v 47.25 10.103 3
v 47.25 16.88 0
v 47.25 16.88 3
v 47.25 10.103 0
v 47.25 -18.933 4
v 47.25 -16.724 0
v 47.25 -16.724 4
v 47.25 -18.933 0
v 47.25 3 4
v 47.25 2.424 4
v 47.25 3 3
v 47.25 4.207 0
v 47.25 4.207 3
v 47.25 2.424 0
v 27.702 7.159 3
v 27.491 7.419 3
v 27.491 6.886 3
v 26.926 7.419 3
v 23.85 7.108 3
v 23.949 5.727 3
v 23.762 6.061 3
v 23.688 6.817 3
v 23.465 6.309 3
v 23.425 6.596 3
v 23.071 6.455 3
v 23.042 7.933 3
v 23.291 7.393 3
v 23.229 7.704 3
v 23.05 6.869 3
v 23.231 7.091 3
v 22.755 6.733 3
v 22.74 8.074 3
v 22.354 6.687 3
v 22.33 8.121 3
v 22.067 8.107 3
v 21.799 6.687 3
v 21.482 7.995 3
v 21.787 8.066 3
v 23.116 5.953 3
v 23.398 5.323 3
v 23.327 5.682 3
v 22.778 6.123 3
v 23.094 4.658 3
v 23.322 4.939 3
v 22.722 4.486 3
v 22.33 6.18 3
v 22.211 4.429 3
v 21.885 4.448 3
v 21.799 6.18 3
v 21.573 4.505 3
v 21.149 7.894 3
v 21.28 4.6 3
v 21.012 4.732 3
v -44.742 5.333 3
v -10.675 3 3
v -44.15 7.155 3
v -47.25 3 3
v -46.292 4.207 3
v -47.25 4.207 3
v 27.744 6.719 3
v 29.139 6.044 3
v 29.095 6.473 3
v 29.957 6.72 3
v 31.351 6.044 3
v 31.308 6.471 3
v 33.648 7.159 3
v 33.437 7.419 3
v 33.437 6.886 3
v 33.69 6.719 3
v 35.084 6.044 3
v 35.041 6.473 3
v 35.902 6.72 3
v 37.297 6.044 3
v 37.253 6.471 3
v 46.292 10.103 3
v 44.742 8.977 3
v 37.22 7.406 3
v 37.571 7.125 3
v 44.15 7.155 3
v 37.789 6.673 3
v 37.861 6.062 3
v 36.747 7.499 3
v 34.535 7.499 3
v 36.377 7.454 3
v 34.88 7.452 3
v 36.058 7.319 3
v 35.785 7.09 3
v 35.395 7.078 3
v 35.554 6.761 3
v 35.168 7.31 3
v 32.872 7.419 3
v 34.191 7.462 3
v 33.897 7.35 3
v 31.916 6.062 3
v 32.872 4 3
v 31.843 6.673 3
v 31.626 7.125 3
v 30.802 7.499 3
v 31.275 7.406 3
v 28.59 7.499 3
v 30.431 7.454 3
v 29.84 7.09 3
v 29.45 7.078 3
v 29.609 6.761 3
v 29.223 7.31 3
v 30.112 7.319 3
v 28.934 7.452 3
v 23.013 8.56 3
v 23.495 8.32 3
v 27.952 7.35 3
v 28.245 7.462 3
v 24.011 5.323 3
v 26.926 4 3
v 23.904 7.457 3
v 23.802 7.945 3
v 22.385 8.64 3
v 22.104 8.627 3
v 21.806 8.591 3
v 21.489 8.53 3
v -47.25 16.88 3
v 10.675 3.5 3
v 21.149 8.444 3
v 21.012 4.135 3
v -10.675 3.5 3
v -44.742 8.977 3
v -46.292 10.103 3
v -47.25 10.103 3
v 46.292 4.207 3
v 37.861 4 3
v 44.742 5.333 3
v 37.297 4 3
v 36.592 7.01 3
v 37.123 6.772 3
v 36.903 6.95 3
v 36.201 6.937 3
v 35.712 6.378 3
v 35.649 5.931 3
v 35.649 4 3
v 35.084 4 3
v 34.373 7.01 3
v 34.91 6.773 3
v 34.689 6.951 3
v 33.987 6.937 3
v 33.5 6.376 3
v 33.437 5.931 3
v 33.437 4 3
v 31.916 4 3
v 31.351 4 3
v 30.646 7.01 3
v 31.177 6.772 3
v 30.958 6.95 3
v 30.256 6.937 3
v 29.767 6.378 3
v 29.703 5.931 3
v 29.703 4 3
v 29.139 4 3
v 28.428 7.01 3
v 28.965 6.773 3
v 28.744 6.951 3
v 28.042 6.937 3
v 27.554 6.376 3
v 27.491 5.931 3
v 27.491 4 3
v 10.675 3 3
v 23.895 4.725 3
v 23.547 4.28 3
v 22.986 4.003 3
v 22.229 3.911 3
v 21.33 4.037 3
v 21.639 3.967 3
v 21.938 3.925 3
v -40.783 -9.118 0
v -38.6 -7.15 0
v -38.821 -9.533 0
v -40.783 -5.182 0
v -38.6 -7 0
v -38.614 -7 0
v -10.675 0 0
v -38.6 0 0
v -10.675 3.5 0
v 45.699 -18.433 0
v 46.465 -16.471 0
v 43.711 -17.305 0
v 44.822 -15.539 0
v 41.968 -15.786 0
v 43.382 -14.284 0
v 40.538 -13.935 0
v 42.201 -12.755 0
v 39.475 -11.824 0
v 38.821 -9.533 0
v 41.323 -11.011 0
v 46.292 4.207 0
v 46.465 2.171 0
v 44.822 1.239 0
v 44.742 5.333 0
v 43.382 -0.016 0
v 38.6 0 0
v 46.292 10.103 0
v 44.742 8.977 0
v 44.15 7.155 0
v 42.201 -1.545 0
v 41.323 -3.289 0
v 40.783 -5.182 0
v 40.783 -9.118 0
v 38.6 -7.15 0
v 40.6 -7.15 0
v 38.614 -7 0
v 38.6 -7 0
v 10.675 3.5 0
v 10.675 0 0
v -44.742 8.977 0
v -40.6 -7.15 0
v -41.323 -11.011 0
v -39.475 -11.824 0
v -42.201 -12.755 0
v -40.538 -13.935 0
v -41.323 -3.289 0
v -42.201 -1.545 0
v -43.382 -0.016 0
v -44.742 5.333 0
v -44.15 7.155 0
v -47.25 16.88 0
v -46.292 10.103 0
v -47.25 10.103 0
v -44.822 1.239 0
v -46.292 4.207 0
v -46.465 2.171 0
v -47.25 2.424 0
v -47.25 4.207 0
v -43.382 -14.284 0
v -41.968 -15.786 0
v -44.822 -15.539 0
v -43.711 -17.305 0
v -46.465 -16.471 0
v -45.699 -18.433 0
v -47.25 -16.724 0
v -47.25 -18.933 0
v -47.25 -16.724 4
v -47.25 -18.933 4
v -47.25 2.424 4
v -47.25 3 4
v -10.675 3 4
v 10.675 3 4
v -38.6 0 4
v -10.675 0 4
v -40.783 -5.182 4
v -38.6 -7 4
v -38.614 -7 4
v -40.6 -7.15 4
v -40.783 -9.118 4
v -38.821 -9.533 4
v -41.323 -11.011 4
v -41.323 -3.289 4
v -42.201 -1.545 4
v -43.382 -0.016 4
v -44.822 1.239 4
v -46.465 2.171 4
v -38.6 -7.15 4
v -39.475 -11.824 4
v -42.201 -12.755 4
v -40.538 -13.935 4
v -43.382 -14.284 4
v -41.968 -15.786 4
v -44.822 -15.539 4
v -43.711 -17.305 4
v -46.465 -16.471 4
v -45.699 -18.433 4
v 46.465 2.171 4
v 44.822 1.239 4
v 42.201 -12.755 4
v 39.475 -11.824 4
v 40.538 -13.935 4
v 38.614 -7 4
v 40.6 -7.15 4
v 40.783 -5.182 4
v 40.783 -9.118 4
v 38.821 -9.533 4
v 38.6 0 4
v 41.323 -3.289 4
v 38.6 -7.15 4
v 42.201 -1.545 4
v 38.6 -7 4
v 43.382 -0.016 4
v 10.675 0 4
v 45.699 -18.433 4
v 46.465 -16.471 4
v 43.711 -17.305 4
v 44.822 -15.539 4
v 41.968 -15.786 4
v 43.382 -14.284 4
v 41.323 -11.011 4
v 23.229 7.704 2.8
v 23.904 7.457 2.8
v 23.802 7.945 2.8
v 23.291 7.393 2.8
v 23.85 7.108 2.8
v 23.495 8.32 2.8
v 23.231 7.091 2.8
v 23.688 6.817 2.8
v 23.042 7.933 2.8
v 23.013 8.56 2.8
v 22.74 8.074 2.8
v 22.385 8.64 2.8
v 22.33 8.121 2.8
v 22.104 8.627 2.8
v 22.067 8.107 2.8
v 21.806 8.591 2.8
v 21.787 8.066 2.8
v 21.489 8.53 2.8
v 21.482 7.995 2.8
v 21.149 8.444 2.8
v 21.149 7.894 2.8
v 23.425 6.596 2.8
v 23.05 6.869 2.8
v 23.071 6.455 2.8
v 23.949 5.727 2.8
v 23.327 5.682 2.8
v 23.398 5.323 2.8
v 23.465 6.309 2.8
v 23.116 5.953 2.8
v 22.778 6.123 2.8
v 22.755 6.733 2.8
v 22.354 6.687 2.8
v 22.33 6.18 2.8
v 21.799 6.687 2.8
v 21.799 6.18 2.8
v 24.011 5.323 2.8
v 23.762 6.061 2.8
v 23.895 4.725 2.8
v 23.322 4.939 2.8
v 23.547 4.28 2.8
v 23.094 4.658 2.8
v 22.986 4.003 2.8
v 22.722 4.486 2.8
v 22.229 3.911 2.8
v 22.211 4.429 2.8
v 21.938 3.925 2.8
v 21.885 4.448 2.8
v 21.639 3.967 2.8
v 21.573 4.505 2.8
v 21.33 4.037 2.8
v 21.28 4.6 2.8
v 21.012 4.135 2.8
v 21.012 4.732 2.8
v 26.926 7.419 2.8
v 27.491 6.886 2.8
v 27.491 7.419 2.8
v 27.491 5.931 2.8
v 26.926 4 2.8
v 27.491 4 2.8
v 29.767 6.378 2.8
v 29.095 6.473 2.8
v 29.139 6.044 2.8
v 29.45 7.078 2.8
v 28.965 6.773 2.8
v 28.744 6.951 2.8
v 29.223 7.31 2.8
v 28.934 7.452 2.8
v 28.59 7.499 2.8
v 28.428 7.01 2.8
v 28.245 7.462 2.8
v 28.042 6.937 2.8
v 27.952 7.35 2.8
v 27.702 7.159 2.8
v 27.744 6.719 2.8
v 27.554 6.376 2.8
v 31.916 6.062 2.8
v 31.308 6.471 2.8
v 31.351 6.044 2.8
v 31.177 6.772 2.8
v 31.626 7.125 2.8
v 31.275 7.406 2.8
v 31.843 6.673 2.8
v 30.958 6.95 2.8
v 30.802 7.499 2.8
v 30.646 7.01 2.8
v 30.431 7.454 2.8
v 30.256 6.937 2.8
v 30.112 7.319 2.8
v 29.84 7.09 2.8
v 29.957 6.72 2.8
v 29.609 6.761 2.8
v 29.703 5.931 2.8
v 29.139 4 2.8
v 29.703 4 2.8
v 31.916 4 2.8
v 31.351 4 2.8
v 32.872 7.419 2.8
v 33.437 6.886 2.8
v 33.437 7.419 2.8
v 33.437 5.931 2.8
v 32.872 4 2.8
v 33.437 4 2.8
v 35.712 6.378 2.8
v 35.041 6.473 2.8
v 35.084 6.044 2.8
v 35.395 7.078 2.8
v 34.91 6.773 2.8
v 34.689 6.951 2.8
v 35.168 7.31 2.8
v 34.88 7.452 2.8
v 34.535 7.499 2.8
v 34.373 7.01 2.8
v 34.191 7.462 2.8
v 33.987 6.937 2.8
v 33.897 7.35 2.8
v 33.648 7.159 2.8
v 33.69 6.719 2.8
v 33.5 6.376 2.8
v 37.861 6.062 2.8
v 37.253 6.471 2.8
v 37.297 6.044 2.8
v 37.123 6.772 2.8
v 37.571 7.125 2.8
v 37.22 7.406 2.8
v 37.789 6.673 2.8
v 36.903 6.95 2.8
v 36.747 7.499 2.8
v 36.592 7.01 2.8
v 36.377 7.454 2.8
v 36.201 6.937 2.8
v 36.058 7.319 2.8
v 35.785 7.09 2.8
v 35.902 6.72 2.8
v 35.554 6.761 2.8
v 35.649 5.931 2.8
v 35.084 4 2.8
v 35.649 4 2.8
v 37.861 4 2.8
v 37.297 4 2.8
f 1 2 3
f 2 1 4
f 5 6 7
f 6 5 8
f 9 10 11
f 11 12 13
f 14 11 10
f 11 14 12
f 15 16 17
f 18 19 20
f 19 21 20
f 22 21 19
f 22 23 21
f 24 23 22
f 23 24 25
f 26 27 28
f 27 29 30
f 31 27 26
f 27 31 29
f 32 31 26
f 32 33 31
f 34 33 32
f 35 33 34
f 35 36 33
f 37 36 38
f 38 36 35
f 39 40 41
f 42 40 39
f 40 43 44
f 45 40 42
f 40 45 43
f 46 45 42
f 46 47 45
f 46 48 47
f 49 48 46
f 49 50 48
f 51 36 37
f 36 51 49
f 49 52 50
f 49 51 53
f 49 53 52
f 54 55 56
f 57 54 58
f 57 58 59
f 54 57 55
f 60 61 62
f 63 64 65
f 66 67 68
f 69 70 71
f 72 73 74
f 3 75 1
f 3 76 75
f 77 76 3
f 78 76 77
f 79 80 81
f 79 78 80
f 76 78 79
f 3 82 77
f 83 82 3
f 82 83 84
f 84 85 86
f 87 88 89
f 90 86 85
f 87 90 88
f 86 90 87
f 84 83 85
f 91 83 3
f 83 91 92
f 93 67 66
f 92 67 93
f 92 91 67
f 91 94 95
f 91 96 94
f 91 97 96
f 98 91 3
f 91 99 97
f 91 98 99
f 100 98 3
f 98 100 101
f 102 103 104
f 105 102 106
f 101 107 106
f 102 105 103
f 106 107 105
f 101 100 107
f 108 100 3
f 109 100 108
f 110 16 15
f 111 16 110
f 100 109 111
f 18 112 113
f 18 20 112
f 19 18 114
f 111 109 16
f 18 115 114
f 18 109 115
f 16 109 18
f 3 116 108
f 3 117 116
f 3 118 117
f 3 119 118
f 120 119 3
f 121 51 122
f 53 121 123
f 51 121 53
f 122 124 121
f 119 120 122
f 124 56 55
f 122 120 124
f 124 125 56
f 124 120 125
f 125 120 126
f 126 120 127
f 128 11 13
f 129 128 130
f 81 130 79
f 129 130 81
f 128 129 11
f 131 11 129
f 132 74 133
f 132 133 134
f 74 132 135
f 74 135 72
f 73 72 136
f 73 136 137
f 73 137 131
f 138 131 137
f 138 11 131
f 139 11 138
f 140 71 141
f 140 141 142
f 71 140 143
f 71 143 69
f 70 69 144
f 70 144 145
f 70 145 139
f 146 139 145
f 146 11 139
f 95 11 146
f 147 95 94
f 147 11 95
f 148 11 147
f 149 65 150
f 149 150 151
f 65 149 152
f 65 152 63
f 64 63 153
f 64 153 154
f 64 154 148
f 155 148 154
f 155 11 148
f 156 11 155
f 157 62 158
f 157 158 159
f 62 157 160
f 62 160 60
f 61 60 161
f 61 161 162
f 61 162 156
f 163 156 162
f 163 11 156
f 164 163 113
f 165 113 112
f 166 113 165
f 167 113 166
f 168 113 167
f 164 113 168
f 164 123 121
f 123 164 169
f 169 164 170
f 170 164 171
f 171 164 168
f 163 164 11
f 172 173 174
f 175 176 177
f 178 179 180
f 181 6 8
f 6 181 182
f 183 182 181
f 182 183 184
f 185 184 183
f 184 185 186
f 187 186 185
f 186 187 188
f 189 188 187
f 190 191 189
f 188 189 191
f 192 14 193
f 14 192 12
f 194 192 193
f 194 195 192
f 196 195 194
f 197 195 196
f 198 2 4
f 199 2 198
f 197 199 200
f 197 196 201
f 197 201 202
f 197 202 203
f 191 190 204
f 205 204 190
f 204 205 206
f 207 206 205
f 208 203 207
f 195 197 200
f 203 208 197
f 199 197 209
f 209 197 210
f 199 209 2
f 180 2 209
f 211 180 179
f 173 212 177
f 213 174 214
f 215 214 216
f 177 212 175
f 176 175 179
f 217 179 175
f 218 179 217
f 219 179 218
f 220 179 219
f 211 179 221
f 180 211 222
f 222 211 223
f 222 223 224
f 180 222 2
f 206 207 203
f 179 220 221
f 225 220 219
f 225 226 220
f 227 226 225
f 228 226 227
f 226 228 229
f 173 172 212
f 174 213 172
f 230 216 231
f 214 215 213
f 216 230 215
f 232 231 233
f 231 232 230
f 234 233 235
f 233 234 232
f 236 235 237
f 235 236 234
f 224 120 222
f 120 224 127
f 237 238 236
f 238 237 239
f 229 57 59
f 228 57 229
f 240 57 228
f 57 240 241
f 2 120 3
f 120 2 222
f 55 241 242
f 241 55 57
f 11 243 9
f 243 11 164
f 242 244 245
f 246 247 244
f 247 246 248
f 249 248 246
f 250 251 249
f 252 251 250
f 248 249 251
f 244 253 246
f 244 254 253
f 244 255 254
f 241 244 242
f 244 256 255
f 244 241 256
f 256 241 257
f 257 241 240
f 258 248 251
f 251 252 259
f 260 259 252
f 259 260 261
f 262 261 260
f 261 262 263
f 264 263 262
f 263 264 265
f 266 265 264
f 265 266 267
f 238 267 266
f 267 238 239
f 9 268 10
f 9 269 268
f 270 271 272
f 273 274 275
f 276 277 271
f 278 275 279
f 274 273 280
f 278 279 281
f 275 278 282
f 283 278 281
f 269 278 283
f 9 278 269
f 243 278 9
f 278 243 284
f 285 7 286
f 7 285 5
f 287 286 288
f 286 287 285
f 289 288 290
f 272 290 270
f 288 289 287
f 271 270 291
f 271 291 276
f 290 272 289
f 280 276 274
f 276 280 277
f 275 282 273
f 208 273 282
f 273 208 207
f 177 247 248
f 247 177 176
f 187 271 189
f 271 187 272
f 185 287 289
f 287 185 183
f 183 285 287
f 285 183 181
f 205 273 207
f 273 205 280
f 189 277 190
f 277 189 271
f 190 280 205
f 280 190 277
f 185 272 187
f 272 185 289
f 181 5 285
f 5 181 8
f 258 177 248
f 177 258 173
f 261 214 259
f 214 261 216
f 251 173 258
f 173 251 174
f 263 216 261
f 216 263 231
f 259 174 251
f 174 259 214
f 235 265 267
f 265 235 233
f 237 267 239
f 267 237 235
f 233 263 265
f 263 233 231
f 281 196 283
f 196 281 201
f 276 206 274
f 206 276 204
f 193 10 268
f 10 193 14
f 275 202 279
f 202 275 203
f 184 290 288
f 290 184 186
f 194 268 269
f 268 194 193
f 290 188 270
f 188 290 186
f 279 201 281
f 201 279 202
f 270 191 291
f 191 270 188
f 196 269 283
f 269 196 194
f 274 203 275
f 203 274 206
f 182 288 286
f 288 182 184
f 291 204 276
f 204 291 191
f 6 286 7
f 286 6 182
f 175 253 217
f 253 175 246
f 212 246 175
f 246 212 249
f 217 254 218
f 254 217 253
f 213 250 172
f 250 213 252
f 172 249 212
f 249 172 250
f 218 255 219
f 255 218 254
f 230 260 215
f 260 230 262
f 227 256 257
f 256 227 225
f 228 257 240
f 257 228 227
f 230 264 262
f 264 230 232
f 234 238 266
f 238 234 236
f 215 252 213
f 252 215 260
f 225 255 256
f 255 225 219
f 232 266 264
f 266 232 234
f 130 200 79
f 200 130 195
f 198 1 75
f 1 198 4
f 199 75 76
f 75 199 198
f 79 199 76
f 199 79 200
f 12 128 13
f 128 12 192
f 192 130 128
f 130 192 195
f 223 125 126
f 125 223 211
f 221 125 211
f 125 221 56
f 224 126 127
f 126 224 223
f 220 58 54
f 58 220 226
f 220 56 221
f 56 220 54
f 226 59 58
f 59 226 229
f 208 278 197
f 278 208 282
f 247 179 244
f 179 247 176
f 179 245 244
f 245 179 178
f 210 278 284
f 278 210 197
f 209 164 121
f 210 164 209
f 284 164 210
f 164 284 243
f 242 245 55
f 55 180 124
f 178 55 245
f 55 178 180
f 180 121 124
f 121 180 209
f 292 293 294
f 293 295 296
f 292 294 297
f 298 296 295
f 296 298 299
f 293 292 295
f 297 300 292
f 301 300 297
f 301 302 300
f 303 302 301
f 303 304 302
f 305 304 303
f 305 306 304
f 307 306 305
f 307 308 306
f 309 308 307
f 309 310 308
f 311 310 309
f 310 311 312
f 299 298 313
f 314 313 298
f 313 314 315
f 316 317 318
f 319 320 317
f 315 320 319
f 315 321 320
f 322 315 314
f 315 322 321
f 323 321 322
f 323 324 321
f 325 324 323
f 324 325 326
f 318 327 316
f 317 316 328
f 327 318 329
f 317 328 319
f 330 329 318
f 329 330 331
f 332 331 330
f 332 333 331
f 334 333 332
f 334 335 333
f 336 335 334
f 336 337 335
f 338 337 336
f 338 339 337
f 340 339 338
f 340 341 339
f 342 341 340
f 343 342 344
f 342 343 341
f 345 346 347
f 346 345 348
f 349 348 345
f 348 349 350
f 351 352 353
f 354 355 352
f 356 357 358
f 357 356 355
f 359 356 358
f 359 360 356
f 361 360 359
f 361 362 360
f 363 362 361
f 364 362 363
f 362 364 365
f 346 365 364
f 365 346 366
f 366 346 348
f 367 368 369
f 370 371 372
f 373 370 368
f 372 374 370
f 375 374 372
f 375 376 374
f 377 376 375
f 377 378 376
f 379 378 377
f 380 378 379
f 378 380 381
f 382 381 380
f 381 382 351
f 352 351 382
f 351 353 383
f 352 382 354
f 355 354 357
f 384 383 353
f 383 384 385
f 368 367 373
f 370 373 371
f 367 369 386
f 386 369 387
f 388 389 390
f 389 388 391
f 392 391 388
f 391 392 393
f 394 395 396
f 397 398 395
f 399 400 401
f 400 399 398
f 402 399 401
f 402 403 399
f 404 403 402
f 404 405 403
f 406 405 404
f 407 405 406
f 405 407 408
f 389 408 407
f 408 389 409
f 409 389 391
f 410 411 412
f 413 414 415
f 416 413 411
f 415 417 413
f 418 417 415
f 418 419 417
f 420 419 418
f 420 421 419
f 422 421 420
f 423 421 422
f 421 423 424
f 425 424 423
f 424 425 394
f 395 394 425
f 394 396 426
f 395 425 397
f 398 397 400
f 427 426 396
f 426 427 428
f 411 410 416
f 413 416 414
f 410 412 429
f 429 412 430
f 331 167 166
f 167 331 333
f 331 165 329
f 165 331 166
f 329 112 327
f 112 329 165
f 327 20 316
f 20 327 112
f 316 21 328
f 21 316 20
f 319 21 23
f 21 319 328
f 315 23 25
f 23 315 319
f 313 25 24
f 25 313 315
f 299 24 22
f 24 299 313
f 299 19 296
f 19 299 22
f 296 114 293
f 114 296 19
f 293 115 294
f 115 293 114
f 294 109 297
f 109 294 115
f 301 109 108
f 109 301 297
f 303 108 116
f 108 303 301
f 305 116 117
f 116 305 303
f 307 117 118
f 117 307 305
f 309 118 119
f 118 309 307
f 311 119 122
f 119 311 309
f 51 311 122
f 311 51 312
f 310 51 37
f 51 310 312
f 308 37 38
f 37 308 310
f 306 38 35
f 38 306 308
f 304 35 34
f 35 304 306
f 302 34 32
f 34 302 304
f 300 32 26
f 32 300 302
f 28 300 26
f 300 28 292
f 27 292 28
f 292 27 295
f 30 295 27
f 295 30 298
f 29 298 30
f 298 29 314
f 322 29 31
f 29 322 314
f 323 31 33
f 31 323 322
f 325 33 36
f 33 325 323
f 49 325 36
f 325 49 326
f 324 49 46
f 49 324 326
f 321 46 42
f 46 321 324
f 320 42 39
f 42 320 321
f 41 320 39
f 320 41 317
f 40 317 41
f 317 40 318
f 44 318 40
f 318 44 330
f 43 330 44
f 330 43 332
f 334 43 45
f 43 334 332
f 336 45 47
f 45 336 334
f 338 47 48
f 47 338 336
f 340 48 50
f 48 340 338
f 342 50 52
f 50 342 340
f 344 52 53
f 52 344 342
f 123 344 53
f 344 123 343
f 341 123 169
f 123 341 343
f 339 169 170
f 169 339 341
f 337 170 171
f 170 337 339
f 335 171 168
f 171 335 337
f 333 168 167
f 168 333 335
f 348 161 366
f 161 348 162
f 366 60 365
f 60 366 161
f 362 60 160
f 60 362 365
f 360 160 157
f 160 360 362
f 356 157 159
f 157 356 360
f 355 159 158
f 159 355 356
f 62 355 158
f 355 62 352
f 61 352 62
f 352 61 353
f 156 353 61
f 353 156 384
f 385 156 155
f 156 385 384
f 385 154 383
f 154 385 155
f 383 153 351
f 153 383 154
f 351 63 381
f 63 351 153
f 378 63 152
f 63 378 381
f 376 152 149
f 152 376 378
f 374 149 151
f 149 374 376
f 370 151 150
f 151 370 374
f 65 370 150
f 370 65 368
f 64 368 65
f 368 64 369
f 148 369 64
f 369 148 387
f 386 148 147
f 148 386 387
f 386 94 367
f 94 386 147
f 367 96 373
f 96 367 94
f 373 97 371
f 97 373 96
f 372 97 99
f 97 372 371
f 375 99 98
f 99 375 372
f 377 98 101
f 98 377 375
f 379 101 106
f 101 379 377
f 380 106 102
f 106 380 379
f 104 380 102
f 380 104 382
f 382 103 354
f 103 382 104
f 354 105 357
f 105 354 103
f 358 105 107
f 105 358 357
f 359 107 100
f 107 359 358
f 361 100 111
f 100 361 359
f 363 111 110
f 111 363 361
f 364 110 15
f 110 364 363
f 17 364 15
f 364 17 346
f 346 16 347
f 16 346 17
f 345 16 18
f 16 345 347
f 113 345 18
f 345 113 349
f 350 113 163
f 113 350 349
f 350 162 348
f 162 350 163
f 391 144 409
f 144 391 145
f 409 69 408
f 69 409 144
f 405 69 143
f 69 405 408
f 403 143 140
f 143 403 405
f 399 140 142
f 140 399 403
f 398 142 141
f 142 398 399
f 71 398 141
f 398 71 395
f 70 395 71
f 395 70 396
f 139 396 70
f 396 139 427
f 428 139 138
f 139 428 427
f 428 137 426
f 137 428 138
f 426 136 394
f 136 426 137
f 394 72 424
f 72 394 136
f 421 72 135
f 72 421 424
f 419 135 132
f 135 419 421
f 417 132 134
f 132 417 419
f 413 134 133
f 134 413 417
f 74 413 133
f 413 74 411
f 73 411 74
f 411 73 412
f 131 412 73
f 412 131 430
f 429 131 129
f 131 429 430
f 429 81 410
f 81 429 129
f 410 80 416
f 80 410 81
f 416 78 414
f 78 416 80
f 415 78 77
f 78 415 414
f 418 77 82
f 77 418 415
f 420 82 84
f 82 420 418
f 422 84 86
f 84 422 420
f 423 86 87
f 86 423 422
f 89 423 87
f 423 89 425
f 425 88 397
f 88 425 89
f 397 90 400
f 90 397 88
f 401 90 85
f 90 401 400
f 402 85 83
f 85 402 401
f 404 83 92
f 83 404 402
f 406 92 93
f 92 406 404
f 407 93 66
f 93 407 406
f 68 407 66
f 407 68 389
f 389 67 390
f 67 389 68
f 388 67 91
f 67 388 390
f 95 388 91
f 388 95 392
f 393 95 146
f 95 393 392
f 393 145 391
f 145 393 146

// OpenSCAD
// Customizable Z-axis shim for FlashForge Creator Pro 2016 by DrLex
// Based on Thing:1475239 by ben8p and Thing:557994 by Atomist
// Released under Creative Commons - Attribution - Share Alike license
// v2.1, 2019/08/10

// The distance you want the Z homing to be lowered.
ShimHeight = 3; // [1:0.1:10]
// How thick the clamping part should be.
ClampHeight = 4; // [2:0.1:10]
// Print the thickness on the model?
Label = "yes"; // [yes, no]
// Useful for very thin thims where Shimheight is smaller than ClampHeight.
Reinforce = "no"; // [yes, no]

/* [Hidden] */
RodDistance = 100; // [80:0.1:120]
RodDiameter = 19; // [15:0.1:25]

RodRadius = RodDiameter/2;
RodCenter = RodDistance/2 + 0.1;
MaxX = RodCenter - 2.85;
ClampScale = [1, 1.062, 1];

difference() {
    union() {
        difference() {
            union() {
                translate([-MaxX, 3, 0]) cube([2*MaxX, 13.88, ShimHeight]);
                translate([0, -2.0, ClampHeight/2]) cube([RodDistance, 10, ClampHeight], center=true);
                translate([RodCenter, -7.15, ClampHeight/2]) scale(ClampScale) cylinder(r=RodRadius + 2, h=ClampHeight, center=true, $fn=32);
                translate([-RodCenter, -7.15, ClampHeight/2]) scale(ClampScale) cylinder(r=RodRadius + 2, h=ClampHeight, center=true, $fn=32);
            }
            
            // Rod holes
            translate([RodCenter, -7.15, 9]) scale(ClampScale) cylinder(r=RodRadius, h=20, center=true, $fn=32);
            translate([-RodCenter, -7.15, 9]) scale(ClampScale) cylinder(r=RodRadius, h=20, center=true, $fn=32);
            
            // Side screw holes
            translate([MaxX, 7.155, 9]) cylinder(r=3.1, h=20, center=true);
            translate([-MaxX, 7.155, 9]) cylinder(r=3.1, h=20, center=true);

            
            // Chop off the sides
            translate([MaxX, -2*RodDiameter, -5]) cube([RodDiameter, 4 * RodDiameter, 20]);
            translate([-MaxX - RodDiameter, -2*RodDiameter, -5]) cube([RodDiameter, 4 * RodDiameter, 20]);
            // Chop off the center
            translate([0, -10, 9]) cube([2*(RodCenter - RodRadius - 2), 20, 20], center=true);
            
            if(ClampHeight > ShimHeight) {
                // Remove pieces of the clamps sticking out
                translate([-MaxX - 1, 3, ShimHeight]) cube([2*MaxX + 2, 13.88, 20]);
            }
        }

        if(Reinforce == "yes") {
            translate([0, 1.85, ClampHeight/2]) isoTrapezoidX(22, 30, 3.7, ClampHeight);
        }
    }
    
    // Space for leadscrew bearing
    if(Reinforce == "yes") {
        translate([0, 0, ClampHeight/2]) isoTrapezoidX(18, 28, 5, ClampHeight+0.1);
    }
    else {
        translate([0, 0, 9]) cube([21.35, 7, 20], center=true);
    }
        
    if(Label == "yes") {
        translate([MaxX-9, 4, ShimHeight - 0.2]) linear_extrude(1, convexity=3)  text(str(ShimHeight, " mm"), 4.5, font="Roboto", halign="right", $fn=14);
    }
}

module isoTrapezoidX(sizeXTop, sizeXBtm, sizeY, sizeZ) {
    linear_extrude(height=sizeZ, center=true) polygon([[-sizeXTop/2, sizeY/2], [sizeXTop/2, sizeY/2], [sizeXBtm/2, -sizeY/2], [-sizeXBtm/2, -sizeY/2]]);

}
